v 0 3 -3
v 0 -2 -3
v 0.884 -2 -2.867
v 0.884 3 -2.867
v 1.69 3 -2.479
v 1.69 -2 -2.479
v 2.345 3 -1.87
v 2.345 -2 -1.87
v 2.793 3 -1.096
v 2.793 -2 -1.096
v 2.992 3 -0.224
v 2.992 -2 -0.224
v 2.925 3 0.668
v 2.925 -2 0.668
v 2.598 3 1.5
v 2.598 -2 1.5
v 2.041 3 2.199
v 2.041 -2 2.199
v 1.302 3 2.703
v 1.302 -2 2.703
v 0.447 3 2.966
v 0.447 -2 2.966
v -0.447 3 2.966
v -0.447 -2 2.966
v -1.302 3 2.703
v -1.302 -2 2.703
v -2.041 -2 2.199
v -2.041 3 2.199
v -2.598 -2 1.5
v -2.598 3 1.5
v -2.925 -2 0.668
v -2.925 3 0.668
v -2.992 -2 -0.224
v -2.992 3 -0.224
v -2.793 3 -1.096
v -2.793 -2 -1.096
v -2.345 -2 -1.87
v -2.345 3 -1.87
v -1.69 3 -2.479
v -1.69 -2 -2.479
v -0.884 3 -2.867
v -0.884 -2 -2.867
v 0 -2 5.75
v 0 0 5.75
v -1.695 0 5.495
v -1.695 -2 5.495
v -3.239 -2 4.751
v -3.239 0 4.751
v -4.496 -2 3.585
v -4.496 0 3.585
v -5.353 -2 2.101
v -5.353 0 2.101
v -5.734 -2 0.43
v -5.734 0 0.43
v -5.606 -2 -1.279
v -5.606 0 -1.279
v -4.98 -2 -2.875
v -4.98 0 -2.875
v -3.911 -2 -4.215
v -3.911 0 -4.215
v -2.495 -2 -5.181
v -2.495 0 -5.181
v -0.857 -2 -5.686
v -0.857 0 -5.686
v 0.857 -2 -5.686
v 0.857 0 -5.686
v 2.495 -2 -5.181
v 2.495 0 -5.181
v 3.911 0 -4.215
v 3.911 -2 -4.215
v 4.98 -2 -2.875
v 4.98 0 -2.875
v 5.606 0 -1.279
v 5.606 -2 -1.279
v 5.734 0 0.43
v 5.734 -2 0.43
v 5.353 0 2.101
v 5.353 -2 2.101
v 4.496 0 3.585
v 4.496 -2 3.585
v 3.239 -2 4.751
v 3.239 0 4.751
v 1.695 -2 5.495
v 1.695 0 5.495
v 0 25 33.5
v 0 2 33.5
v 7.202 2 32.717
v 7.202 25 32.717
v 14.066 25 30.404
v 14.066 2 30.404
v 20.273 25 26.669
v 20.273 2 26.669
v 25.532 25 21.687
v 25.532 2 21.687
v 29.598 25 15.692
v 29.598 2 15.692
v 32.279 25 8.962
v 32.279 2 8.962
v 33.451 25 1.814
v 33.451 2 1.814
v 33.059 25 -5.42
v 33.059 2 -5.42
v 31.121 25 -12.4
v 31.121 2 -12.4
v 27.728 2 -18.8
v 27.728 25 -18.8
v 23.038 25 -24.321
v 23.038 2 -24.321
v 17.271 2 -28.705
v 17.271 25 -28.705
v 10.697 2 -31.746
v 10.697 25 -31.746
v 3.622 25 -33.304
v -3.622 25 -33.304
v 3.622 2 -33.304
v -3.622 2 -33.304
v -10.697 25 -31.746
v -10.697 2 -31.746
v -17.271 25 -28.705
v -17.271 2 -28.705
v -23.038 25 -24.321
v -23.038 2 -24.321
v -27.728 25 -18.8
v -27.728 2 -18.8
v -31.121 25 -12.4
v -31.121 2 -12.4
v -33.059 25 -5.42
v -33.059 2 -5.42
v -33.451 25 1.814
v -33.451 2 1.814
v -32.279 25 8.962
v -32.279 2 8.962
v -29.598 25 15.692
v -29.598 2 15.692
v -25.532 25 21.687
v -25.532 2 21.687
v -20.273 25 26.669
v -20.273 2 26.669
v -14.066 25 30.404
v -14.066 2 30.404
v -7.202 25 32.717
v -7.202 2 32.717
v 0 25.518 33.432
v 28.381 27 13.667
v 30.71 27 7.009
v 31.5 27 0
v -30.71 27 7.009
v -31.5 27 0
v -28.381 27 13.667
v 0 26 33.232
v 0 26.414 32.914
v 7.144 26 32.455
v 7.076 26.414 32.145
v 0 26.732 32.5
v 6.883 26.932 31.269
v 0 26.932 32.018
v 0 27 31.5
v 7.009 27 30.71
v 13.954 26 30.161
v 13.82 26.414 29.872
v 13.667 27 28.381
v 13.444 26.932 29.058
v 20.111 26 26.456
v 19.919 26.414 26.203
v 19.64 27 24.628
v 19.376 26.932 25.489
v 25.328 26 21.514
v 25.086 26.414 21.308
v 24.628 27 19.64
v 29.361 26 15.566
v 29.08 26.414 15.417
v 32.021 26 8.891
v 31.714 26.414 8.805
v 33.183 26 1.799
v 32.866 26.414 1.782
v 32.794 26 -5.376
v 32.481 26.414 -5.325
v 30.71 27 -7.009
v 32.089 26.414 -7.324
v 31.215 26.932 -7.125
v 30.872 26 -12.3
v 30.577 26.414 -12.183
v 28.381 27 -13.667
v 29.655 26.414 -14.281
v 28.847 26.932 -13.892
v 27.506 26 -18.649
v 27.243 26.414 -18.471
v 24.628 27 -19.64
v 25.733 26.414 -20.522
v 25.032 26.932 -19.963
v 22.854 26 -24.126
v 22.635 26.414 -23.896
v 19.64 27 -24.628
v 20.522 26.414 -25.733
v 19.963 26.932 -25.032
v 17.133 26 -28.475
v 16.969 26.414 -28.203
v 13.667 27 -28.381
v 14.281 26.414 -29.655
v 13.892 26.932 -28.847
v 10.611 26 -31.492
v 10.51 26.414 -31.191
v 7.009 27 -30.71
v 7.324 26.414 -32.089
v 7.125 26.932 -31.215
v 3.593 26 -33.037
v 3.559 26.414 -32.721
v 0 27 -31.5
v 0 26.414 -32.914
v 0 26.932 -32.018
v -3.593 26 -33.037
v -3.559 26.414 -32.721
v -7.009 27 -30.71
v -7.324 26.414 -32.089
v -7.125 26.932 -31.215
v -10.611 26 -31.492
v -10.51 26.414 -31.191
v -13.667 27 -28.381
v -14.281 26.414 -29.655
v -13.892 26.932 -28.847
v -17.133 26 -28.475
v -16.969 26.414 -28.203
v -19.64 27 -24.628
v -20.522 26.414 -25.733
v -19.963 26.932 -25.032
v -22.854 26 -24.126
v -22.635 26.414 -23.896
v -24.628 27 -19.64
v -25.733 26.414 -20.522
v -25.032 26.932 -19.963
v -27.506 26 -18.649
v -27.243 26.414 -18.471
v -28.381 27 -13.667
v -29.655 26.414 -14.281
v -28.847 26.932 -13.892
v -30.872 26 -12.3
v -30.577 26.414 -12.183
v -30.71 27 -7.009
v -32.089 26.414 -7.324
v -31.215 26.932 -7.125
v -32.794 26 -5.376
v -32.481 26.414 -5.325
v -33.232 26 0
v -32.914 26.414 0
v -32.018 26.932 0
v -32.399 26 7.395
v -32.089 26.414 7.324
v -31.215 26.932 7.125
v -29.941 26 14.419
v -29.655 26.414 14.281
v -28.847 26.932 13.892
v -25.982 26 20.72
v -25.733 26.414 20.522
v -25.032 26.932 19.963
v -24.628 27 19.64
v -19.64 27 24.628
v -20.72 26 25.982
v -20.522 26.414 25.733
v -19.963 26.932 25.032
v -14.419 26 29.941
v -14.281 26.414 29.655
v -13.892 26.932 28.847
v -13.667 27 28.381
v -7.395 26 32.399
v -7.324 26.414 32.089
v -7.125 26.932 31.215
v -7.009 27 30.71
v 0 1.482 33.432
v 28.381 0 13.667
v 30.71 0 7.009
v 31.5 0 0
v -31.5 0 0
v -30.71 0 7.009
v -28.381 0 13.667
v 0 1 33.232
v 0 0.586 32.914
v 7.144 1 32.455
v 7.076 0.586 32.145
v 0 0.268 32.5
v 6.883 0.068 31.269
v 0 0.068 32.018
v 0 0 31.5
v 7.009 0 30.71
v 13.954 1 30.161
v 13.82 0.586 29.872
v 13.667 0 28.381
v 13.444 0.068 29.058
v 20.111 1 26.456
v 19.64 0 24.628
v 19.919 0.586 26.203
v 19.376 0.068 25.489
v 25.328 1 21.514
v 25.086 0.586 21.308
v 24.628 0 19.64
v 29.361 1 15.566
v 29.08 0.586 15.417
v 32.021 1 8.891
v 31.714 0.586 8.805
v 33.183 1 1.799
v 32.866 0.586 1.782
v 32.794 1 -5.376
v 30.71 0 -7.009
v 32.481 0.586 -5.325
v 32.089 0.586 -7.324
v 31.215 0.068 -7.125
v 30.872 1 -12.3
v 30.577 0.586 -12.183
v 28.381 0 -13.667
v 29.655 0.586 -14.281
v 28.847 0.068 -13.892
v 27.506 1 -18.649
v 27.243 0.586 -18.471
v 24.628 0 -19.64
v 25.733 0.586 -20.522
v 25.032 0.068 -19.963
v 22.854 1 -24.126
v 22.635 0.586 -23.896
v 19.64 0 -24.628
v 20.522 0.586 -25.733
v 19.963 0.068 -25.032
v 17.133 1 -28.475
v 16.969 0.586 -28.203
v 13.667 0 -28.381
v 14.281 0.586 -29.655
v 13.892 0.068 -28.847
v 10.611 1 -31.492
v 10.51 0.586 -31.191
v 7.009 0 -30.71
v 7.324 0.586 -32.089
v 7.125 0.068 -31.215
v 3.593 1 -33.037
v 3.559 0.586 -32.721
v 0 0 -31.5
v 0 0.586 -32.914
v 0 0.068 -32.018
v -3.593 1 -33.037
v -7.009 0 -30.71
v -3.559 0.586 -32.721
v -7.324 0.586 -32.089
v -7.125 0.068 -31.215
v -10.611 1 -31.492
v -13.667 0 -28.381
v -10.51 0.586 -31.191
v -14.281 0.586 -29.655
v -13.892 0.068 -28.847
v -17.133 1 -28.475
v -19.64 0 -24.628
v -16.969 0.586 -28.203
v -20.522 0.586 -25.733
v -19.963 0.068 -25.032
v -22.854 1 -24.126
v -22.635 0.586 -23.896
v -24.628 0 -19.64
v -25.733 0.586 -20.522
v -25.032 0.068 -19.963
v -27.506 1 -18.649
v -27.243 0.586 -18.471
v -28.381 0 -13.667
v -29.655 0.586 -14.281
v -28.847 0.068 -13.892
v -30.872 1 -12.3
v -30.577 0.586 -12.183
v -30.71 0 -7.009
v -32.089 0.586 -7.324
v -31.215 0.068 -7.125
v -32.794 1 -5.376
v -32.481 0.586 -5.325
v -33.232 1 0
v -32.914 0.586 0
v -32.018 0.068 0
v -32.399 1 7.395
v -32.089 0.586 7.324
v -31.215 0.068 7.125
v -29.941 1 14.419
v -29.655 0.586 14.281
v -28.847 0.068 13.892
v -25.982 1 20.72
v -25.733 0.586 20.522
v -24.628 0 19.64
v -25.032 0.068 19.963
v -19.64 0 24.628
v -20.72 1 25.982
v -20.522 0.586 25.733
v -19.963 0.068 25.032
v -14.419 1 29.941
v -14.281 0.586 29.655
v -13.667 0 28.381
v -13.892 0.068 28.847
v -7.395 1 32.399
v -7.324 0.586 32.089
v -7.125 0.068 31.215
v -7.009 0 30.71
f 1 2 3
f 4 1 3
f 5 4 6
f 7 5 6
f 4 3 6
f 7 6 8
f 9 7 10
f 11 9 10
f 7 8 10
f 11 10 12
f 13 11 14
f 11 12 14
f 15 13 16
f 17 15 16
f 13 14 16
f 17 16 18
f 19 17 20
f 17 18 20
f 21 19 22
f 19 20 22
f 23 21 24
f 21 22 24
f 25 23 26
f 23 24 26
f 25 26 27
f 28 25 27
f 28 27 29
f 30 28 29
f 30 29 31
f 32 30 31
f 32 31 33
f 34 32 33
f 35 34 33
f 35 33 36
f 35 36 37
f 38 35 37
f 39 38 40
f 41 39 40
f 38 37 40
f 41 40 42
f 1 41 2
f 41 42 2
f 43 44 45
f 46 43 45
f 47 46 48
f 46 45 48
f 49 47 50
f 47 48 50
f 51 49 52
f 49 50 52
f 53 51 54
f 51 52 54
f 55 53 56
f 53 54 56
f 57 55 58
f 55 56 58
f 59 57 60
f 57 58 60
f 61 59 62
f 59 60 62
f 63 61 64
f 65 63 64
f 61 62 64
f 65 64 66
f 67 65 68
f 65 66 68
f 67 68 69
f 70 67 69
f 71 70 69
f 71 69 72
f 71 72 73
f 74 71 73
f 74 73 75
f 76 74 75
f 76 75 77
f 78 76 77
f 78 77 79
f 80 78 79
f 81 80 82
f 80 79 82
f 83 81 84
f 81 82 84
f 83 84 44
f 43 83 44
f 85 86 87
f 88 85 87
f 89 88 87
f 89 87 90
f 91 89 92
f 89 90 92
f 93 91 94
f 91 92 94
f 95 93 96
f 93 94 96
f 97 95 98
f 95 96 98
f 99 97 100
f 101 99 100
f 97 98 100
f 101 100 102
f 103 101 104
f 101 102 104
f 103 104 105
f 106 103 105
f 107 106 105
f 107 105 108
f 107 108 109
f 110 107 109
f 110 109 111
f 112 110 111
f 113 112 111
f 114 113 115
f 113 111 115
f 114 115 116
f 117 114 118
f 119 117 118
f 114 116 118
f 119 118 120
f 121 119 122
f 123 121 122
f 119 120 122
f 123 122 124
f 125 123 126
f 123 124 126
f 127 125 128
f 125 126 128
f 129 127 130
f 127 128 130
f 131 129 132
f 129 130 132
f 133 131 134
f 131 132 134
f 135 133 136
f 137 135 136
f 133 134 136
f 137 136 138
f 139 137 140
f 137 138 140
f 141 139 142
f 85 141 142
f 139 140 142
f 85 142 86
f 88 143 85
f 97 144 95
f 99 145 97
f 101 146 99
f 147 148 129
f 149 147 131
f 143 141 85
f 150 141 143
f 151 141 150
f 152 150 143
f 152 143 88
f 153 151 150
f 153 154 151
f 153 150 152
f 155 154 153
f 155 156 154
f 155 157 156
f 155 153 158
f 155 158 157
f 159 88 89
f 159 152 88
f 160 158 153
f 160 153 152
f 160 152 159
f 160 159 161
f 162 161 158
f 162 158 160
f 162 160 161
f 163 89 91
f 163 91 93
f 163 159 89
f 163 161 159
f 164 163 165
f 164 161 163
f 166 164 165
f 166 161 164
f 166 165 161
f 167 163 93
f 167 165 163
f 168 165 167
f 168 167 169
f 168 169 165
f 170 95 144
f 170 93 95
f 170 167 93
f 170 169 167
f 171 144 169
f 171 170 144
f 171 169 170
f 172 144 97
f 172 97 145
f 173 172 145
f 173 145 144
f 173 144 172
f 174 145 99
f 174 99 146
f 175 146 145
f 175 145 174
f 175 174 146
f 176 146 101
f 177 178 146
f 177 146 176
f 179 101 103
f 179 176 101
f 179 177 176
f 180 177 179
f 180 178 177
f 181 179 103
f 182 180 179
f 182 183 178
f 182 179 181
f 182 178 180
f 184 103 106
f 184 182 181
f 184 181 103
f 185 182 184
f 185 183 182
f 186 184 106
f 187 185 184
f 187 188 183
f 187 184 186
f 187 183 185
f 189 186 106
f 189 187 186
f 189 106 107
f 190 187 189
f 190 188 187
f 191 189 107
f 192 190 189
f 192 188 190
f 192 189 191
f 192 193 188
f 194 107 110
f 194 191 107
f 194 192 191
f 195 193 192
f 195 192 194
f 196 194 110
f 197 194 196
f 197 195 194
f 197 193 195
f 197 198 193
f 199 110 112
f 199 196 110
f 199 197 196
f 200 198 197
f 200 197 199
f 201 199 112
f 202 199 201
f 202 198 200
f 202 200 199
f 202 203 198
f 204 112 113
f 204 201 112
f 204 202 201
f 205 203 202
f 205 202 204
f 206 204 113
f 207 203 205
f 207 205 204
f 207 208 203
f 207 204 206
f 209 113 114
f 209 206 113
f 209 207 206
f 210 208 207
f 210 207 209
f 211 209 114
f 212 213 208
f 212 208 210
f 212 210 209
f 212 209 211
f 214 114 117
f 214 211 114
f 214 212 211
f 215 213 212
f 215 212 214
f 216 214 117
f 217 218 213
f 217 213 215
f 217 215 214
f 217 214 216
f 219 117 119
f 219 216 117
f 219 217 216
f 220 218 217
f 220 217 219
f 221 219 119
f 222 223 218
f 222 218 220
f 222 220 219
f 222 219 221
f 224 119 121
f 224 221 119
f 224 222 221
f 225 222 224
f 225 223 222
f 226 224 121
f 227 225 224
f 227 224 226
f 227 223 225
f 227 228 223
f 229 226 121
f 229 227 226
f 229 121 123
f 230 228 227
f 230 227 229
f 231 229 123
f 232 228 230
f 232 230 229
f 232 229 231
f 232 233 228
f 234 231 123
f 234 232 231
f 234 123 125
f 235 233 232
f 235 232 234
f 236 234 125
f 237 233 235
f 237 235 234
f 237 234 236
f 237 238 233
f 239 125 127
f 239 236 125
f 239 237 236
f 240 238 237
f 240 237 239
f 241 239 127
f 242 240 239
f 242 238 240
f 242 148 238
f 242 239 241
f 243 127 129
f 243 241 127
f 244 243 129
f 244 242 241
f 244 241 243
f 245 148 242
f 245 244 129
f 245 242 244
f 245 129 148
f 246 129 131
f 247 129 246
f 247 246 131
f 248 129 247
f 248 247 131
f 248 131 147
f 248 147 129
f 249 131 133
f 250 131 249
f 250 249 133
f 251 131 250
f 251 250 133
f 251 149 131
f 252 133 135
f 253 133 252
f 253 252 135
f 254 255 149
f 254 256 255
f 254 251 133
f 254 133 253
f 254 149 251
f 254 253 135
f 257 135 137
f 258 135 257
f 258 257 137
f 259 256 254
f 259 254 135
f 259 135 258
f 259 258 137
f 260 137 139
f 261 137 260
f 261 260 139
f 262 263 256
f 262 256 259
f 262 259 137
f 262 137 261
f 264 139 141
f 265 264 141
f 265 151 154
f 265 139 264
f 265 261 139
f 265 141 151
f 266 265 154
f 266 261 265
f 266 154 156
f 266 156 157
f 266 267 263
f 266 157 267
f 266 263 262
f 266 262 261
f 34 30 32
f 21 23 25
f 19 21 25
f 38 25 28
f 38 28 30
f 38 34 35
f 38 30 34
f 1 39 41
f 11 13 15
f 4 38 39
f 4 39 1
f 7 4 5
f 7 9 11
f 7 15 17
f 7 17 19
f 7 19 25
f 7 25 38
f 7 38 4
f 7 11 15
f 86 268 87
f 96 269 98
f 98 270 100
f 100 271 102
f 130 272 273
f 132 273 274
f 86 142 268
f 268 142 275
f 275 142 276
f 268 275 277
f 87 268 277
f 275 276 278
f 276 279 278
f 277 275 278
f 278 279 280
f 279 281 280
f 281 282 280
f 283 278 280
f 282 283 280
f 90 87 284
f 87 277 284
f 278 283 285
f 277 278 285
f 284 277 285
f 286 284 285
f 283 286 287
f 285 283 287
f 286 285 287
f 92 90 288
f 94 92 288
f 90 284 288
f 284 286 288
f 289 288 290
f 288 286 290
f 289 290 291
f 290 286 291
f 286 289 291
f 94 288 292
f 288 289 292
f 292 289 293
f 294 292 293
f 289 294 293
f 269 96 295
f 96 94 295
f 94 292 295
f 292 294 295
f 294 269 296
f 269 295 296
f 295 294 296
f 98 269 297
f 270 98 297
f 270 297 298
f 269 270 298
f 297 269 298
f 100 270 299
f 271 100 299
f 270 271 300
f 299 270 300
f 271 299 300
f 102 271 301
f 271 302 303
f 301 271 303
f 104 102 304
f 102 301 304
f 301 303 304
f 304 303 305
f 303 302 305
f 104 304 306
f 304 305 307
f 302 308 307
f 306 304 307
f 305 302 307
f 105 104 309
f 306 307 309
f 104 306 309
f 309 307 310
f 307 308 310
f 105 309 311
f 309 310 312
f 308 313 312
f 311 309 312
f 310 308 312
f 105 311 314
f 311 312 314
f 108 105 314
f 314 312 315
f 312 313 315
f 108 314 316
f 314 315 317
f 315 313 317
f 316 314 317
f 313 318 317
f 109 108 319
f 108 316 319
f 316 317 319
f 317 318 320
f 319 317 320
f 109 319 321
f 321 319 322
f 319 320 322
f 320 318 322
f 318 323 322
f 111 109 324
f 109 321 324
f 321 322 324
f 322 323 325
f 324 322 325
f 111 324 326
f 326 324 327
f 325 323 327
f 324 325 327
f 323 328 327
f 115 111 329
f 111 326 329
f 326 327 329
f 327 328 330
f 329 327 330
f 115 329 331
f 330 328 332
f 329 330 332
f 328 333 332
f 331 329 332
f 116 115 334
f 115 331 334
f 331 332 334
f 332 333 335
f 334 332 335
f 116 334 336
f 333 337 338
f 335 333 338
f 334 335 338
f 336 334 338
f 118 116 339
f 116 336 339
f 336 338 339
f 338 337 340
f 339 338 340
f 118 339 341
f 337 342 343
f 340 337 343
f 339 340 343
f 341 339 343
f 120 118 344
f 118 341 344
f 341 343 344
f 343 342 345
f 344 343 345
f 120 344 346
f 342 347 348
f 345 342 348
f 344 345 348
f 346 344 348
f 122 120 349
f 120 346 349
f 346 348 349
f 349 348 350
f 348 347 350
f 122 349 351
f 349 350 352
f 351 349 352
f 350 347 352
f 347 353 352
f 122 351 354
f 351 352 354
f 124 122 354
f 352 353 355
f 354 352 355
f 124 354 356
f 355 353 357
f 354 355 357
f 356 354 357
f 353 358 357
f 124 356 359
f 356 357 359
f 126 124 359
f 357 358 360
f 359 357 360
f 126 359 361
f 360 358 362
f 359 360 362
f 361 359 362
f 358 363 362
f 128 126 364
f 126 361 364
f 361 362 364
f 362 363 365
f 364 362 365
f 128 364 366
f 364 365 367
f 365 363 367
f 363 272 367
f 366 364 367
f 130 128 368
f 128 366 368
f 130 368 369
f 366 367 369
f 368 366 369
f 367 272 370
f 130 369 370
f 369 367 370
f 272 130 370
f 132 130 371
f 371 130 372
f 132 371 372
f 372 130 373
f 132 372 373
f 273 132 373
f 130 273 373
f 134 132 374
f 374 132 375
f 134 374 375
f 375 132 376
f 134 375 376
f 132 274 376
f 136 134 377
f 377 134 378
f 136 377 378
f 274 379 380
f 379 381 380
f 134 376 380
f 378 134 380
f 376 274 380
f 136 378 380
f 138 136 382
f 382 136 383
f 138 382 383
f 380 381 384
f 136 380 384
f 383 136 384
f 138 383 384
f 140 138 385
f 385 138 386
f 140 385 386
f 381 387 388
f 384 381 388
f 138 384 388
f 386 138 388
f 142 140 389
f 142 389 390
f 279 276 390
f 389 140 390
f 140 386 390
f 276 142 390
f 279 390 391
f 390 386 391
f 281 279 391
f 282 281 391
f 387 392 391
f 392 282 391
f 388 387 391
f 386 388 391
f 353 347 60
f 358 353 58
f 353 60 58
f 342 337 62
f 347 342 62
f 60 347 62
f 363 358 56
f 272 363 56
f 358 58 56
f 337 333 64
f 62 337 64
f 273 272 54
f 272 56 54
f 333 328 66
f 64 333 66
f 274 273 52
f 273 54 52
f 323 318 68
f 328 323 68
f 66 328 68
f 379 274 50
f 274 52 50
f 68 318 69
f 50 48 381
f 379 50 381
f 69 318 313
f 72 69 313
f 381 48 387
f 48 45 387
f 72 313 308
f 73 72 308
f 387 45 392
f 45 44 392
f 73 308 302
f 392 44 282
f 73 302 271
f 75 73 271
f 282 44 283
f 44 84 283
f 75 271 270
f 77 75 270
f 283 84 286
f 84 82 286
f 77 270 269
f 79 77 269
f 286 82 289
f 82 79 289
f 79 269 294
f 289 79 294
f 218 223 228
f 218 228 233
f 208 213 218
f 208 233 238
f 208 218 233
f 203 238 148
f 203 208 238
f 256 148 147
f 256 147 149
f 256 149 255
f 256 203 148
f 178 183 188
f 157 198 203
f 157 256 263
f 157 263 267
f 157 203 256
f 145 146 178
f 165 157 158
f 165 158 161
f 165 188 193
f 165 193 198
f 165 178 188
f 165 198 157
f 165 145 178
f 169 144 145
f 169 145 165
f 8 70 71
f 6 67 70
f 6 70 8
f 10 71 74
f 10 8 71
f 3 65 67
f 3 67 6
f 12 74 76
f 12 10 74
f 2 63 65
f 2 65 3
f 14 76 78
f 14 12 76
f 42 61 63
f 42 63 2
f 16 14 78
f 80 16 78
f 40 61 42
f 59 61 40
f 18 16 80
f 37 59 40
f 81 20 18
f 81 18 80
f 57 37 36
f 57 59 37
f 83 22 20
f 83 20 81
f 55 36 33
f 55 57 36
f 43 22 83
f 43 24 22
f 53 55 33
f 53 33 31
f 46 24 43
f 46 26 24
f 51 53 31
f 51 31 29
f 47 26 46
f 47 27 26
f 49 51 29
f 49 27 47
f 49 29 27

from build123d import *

# Parameters (mm, degrees)
ESBO_O1_R                = 33.5
RESSALTO_EXTRUS_O1_DEPTH = 27
FILETE1_R                = 2
ESBO_O2_R                = 5.75
RESSALTO_EXTRUS_O2_DEPTH = 2
ESBO_O3_R                = 3
CORTE_EXTRUS_O1_DEPTH    = 5


with BuildPart() as part:
    # Esboço1 → Ressalto-extrusão1 (new body)
    with BuildSketch(Plane(origin=(0, 0, 0), x_dir=(1, 0, 0), z_dir=(0, 1, 0))):
        with Locations(Location((0, 0, 0), (0, 0, 270))):
            Circle(ESBO_O1_R)
    extrude(amount=RESSALTO_EXTRUS_O1_DEPTH)

    # Filete1
    filete1_edges = [part.edges().sort_by_distance(p)[0] for p in [
        (0, 0, -33.5),
        (0, 27, -33.5),
    ]]
    fillet(filete1_edges, radius=FILETE1_R)

    # Esboço2 → Ressalto-extrusão2 (add)
    with BuildSketch(Plane(origin=(0, 0, 0), x_dir=(-1, 0, 0), z_dir=(0, -1, 0))):
        with Locations(Location((0, 0, 0), (0, 0, 270))):
            Circle(ESBO_O2_R)
    extrude(amount=RESSALTO_EXTRUS_O2_DEPTH)

    # Esboço3 → Corte-extrusão1 (cut)
    with BuildSketch(Plane.XZ.offset(2)):
        with Locations(Location((0, 0, 0), (0, 0, 270))):
            Circle(ESBO_O3_R)
    extrude(amount=-CORTE_EXTRUS_O1_DEPTH, mode=Mode.SUBTRACT)


solid = part.part
